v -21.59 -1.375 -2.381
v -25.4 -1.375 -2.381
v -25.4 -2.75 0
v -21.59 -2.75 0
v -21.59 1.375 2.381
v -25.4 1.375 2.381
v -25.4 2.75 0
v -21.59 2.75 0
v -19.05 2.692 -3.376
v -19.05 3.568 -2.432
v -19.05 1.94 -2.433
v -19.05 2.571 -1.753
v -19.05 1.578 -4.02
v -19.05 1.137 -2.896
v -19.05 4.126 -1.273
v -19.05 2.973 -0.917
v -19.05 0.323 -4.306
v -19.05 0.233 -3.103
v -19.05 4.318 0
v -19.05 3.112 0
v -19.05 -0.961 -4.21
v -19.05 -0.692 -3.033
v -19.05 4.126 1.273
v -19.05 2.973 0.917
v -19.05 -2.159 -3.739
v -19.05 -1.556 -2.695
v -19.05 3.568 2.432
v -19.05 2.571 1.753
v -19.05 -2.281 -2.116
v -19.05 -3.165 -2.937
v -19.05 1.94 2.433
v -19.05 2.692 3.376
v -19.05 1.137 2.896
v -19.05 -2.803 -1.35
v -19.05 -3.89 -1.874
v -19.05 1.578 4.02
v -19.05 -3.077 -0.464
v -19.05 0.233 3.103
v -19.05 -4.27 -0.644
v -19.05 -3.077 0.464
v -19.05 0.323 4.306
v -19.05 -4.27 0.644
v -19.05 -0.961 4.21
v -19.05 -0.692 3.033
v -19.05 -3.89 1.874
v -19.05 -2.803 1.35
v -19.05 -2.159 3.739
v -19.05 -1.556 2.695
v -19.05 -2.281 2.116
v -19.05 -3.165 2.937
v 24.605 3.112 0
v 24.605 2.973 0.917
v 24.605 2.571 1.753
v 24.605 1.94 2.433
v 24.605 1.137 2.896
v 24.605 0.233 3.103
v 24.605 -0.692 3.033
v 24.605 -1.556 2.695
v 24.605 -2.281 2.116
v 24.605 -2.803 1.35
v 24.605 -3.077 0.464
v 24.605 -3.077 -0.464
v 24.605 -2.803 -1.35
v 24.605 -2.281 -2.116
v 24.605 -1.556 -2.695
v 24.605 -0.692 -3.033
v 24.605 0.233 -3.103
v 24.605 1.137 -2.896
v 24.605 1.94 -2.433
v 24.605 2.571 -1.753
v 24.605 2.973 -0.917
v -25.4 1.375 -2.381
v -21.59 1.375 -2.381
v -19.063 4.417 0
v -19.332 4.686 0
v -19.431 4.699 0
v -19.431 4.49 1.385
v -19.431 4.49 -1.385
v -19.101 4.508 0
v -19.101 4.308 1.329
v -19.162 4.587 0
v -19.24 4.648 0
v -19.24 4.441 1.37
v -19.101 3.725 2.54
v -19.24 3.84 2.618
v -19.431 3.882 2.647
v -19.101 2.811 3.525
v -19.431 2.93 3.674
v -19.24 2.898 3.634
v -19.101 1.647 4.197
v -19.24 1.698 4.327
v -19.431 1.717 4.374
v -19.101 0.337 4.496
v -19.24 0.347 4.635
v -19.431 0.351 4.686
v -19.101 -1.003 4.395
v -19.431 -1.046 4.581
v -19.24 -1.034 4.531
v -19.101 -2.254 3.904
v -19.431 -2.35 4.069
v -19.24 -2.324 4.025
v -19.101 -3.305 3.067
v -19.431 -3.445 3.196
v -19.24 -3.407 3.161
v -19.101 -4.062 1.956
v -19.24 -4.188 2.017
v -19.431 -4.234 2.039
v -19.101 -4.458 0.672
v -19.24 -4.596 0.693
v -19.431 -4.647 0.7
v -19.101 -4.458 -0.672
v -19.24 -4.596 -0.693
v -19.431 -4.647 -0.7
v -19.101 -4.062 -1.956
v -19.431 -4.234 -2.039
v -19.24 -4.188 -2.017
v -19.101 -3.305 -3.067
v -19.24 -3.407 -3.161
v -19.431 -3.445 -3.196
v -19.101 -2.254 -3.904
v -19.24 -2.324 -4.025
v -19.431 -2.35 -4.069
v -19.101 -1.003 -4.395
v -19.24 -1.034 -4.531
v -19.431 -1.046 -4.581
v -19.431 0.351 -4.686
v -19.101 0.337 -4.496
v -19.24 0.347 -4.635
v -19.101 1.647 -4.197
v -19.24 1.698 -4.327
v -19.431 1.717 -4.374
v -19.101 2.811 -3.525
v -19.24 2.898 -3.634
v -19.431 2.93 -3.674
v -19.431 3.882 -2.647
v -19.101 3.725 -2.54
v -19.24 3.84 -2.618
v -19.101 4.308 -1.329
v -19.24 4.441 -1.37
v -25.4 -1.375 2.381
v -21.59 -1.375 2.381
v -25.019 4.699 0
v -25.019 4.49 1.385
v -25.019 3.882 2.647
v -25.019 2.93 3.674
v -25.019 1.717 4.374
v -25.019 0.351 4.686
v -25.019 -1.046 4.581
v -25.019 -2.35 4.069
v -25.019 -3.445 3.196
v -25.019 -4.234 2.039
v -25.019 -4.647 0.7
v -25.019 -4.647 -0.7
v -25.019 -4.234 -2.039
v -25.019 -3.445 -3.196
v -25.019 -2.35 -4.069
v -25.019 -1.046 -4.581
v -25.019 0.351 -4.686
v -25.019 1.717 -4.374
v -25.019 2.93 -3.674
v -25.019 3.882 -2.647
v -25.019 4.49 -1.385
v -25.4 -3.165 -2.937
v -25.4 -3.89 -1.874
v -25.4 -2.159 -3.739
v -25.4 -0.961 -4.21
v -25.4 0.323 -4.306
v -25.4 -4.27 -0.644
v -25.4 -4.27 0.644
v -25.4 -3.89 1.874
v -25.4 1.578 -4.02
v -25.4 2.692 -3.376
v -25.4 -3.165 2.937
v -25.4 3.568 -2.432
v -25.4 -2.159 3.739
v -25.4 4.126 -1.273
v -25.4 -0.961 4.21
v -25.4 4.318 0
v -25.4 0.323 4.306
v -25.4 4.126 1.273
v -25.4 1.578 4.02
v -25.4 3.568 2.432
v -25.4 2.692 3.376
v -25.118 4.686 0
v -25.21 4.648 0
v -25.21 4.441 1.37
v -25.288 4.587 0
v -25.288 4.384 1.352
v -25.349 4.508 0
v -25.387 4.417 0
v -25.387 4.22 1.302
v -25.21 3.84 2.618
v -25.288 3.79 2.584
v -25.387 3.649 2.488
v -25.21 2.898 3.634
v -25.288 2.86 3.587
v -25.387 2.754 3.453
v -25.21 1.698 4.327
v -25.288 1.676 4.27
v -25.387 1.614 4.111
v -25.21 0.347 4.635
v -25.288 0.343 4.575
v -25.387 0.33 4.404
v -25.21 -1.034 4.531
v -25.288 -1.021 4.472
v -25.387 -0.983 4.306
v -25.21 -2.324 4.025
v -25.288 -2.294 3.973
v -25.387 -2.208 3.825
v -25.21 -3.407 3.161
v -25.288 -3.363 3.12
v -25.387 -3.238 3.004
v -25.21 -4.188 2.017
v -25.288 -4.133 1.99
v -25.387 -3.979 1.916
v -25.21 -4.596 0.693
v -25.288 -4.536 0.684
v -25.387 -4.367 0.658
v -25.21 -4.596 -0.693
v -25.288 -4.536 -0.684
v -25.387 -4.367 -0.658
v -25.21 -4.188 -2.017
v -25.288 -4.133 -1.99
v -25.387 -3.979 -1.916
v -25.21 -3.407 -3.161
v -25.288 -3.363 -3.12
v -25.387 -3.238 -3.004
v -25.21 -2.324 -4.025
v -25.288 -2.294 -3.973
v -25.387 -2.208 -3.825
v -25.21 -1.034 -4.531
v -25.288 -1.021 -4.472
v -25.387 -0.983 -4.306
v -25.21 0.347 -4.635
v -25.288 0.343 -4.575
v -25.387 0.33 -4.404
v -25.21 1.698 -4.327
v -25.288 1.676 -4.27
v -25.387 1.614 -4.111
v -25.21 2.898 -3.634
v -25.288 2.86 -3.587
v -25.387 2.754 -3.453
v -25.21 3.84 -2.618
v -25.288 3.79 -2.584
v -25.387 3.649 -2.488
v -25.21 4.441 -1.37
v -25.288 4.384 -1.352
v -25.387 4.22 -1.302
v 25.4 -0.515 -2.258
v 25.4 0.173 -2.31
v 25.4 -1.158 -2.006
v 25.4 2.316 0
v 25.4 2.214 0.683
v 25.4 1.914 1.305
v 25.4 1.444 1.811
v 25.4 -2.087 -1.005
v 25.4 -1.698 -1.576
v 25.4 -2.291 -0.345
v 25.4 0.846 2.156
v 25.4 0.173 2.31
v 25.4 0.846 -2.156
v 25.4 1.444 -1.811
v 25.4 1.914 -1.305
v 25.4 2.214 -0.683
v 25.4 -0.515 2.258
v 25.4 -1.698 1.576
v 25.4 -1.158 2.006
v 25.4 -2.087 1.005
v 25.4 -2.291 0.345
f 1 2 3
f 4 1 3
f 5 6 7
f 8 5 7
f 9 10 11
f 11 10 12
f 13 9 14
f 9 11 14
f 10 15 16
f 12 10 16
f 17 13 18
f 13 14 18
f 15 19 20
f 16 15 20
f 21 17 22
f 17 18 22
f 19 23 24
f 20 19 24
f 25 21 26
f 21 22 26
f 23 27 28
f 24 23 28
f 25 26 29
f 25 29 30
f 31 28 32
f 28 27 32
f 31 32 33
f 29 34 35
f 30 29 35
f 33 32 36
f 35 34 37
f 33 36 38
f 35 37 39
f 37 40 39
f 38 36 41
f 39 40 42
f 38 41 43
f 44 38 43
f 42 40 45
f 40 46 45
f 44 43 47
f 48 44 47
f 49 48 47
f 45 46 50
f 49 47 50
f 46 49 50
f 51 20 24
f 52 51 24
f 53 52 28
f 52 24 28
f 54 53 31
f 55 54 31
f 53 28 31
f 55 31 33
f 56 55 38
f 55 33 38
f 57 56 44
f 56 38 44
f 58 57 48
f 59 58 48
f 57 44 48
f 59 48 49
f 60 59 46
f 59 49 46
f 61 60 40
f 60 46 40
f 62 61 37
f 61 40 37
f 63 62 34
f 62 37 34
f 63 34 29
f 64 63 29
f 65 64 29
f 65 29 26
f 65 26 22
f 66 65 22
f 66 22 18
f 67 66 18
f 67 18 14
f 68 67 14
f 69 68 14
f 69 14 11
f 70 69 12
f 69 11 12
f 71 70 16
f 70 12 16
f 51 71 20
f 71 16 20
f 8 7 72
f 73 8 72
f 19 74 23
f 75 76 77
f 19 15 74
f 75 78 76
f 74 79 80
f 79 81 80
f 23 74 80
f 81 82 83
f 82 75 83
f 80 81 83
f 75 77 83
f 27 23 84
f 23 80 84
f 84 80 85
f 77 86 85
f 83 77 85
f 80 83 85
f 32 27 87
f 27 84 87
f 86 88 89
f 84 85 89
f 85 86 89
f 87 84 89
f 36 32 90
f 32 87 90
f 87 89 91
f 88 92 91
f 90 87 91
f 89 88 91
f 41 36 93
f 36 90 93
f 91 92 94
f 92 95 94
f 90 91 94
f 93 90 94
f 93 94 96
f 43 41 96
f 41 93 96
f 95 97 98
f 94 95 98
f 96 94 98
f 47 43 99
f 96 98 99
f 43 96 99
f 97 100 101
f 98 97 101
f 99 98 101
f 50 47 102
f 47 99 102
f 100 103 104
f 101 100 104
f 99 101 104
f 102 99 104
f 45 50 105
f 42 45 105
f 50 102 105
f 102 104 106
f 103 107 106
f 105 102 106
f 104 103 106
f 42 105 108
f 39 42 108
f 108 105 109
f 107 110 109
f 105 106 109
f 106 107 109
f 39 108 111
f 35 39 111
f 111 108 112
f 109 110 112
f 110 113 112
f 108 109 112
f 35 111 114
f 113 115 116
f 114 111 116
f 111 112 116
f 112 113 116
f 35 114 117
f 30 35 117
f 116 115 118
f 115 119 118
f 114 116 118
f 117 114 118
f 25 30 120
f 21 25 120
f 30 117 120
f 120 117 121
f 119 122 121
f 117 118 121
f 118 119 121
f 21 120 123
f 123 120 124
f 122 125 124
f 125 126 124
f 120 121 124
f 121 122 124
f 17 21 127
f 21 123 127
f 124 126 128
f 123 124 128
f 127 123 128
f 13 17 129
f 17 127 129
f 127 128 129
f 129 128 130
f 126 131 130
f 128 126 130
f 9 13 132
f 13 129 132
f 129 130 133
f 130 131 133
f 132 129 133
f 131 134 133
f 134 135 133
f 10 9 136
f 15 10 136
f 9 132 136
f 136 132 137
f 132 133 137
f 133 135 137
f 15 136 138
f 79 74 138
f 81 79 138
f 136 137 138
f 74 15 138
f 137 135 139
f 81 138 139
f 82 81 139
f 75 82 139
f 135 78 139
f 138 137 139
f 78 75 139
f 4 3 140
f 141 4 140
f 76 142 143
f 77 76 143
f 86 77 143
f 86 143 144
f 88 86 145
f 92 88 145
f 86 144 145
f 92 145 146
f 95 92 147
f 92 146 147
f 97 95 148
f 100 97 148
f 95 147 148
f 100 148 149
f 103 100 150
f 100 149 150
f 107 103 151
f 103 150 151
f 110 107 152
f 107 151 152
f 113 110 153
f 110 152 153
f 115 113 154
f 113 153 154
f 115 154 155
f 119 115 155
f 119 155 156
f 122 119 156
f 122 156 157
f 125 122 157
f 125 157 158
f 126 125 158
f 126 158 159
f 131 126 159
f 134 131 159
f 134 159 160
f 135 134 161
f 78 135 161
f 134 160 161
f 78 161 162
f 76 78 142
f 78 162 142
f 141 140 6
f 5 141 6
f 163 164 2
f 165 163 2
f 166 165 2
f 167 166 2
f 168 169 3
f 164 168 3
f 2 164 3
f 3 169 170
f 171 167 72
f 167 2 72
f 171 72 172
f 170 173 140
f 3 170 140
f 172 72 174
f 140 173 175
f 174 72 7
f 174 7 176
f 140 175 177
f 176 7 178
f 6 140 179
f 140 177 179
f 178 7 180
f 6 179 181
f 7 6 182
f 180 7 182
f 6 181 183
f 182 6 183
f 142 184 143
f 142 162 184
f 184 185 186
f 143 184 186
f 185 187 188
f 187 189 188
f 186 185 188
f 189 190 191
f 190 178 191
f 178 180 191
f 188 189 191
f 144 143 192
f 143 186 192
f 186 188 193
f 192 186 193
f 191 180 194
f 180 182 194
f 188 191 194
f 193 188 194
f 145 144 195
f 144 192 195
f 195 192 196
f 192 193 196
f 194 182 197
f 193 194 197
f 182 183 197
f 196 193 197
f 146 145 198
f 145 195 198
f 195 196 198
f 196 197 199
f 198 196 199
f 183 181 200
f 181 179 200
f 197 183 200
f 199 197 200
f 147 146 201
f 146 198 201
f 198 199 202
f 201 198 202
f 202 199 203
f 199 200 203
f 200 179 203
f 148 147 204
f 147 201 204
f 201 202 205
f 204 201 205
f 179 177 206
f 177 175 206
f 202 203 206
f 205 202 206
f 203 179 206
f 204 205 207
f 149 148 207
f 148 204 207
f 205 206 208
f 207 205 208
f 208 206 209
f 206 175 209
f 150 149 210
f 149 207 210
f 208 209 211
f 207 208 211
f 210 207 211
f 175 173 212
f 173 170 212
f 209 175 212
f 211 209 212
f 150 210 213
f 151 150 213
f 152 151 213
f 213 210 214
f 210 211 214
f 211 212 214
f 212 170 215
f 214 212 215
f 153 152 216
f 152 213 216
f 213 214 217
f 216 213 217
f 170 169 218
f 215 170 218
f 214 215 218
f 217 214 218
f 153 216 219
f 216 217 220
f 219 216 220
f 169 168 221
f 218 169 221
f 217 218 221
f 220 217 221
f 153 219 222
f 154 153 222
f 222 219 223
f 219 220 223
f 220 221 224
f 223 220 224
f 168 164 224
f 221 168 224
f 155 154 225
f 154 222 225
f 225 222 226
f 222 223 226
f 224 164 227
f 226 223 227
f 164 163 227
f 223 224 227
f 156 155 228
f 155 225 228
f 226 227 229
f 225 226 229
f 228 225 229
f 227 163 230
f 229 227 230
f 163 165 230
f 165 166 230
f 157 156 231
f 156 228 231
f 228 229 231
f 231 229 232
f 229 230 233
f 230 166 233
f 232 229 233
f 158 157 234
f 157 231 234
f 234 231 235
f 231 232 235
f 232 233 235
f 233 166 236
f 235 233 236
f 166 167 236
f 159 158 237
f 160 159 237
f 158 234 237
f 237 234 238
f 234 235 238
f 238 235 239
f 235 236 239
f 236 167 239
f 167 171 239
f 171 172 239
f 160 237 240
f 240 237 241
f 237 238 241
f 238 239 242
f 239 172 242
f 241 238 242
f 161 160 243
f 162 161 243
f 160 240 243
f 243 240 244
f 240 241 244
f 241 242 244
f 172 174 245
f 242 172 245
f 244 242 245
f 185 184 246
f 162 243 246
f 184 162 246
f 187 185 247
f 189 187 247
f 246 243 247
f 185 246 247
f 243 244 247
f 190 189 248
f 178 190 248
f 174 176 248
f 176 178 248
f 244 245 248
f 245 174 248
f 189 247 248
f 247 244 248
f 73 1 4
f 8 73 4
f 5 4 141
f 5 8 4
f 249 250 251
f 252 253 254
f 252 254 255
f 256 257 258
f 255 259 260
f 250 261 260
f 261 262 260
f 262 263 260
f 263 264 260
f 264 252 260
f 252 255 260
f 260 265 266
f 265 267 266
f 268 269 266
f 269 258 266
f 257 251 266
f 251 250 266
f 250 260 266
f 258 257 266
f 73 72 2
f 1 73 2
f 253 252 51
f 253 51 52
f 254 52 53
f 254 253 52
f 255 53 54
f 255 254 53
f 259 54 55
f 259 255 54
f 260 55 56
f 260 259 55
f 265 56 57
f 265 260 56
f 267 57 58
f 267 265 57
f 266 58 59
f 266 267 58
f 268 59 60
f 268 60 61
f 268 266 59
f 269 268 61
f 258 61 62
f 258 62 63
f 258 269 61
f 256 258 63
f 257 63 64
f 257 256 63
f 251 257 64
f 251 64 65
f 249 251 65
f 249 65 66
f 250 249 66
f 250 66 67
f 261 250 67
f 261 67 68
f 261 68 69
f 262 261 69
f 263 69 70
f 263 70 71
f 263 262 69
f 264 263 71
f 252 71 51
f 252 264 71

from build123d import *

# Parameters (mm, degrees)
EXTRUDE1_DEPTH = 3.81
FILLET1_R      = 0.381
CHAMFER1_SIZE  = 0.79502


with BuildPart() as part:
    # Sketch1 → Revolve1 (revolve)
    with BuildSketch(Plane.XY):
        Polygon((25.4, 0), (25.4, 3.1115), (-19.05, 3.1115), (-19.05, 4.699), (-25.4, 4.699), (-25.4, 0), align=None)
    revolve(axis=Axis((-24.504761338, 0, 0), (1, 0, 0)))

    # Sketch2 → Extrude1 (cut)
    with BuildSketch(Plane.ZY.offset(25.4)):
        Polygon((0, 2.749630657), (-2.38125, 1.374815329), (-2.38125, -1.374815329), (0, -2.749630657), (2.38125, -1.374815329), (2.38125, 1.374815329), align=None)
    extrude(amount=-EXTRUDE1_DEPTH, mode=Mode.SUBTRACT)

    # Fillet1
    fillet1_edges = [part.edges().sort_by_distance(p)[0] for p in [
        (-25.4, -4.699, 0),
        (-19.05, -4.699, 0),
    ]]
    fillet(fillet1_edges, radius=FILLET1_R)

    # Chamfer1
    chamfer1_edges = [part.edges().sort_by_distance(p)[0] for p in [
        (25.4, -3.1115, 0),
    ]]
    chamfer(chamfer1_edges, length=CHAMFER1_SIZE)


solid = part.part
